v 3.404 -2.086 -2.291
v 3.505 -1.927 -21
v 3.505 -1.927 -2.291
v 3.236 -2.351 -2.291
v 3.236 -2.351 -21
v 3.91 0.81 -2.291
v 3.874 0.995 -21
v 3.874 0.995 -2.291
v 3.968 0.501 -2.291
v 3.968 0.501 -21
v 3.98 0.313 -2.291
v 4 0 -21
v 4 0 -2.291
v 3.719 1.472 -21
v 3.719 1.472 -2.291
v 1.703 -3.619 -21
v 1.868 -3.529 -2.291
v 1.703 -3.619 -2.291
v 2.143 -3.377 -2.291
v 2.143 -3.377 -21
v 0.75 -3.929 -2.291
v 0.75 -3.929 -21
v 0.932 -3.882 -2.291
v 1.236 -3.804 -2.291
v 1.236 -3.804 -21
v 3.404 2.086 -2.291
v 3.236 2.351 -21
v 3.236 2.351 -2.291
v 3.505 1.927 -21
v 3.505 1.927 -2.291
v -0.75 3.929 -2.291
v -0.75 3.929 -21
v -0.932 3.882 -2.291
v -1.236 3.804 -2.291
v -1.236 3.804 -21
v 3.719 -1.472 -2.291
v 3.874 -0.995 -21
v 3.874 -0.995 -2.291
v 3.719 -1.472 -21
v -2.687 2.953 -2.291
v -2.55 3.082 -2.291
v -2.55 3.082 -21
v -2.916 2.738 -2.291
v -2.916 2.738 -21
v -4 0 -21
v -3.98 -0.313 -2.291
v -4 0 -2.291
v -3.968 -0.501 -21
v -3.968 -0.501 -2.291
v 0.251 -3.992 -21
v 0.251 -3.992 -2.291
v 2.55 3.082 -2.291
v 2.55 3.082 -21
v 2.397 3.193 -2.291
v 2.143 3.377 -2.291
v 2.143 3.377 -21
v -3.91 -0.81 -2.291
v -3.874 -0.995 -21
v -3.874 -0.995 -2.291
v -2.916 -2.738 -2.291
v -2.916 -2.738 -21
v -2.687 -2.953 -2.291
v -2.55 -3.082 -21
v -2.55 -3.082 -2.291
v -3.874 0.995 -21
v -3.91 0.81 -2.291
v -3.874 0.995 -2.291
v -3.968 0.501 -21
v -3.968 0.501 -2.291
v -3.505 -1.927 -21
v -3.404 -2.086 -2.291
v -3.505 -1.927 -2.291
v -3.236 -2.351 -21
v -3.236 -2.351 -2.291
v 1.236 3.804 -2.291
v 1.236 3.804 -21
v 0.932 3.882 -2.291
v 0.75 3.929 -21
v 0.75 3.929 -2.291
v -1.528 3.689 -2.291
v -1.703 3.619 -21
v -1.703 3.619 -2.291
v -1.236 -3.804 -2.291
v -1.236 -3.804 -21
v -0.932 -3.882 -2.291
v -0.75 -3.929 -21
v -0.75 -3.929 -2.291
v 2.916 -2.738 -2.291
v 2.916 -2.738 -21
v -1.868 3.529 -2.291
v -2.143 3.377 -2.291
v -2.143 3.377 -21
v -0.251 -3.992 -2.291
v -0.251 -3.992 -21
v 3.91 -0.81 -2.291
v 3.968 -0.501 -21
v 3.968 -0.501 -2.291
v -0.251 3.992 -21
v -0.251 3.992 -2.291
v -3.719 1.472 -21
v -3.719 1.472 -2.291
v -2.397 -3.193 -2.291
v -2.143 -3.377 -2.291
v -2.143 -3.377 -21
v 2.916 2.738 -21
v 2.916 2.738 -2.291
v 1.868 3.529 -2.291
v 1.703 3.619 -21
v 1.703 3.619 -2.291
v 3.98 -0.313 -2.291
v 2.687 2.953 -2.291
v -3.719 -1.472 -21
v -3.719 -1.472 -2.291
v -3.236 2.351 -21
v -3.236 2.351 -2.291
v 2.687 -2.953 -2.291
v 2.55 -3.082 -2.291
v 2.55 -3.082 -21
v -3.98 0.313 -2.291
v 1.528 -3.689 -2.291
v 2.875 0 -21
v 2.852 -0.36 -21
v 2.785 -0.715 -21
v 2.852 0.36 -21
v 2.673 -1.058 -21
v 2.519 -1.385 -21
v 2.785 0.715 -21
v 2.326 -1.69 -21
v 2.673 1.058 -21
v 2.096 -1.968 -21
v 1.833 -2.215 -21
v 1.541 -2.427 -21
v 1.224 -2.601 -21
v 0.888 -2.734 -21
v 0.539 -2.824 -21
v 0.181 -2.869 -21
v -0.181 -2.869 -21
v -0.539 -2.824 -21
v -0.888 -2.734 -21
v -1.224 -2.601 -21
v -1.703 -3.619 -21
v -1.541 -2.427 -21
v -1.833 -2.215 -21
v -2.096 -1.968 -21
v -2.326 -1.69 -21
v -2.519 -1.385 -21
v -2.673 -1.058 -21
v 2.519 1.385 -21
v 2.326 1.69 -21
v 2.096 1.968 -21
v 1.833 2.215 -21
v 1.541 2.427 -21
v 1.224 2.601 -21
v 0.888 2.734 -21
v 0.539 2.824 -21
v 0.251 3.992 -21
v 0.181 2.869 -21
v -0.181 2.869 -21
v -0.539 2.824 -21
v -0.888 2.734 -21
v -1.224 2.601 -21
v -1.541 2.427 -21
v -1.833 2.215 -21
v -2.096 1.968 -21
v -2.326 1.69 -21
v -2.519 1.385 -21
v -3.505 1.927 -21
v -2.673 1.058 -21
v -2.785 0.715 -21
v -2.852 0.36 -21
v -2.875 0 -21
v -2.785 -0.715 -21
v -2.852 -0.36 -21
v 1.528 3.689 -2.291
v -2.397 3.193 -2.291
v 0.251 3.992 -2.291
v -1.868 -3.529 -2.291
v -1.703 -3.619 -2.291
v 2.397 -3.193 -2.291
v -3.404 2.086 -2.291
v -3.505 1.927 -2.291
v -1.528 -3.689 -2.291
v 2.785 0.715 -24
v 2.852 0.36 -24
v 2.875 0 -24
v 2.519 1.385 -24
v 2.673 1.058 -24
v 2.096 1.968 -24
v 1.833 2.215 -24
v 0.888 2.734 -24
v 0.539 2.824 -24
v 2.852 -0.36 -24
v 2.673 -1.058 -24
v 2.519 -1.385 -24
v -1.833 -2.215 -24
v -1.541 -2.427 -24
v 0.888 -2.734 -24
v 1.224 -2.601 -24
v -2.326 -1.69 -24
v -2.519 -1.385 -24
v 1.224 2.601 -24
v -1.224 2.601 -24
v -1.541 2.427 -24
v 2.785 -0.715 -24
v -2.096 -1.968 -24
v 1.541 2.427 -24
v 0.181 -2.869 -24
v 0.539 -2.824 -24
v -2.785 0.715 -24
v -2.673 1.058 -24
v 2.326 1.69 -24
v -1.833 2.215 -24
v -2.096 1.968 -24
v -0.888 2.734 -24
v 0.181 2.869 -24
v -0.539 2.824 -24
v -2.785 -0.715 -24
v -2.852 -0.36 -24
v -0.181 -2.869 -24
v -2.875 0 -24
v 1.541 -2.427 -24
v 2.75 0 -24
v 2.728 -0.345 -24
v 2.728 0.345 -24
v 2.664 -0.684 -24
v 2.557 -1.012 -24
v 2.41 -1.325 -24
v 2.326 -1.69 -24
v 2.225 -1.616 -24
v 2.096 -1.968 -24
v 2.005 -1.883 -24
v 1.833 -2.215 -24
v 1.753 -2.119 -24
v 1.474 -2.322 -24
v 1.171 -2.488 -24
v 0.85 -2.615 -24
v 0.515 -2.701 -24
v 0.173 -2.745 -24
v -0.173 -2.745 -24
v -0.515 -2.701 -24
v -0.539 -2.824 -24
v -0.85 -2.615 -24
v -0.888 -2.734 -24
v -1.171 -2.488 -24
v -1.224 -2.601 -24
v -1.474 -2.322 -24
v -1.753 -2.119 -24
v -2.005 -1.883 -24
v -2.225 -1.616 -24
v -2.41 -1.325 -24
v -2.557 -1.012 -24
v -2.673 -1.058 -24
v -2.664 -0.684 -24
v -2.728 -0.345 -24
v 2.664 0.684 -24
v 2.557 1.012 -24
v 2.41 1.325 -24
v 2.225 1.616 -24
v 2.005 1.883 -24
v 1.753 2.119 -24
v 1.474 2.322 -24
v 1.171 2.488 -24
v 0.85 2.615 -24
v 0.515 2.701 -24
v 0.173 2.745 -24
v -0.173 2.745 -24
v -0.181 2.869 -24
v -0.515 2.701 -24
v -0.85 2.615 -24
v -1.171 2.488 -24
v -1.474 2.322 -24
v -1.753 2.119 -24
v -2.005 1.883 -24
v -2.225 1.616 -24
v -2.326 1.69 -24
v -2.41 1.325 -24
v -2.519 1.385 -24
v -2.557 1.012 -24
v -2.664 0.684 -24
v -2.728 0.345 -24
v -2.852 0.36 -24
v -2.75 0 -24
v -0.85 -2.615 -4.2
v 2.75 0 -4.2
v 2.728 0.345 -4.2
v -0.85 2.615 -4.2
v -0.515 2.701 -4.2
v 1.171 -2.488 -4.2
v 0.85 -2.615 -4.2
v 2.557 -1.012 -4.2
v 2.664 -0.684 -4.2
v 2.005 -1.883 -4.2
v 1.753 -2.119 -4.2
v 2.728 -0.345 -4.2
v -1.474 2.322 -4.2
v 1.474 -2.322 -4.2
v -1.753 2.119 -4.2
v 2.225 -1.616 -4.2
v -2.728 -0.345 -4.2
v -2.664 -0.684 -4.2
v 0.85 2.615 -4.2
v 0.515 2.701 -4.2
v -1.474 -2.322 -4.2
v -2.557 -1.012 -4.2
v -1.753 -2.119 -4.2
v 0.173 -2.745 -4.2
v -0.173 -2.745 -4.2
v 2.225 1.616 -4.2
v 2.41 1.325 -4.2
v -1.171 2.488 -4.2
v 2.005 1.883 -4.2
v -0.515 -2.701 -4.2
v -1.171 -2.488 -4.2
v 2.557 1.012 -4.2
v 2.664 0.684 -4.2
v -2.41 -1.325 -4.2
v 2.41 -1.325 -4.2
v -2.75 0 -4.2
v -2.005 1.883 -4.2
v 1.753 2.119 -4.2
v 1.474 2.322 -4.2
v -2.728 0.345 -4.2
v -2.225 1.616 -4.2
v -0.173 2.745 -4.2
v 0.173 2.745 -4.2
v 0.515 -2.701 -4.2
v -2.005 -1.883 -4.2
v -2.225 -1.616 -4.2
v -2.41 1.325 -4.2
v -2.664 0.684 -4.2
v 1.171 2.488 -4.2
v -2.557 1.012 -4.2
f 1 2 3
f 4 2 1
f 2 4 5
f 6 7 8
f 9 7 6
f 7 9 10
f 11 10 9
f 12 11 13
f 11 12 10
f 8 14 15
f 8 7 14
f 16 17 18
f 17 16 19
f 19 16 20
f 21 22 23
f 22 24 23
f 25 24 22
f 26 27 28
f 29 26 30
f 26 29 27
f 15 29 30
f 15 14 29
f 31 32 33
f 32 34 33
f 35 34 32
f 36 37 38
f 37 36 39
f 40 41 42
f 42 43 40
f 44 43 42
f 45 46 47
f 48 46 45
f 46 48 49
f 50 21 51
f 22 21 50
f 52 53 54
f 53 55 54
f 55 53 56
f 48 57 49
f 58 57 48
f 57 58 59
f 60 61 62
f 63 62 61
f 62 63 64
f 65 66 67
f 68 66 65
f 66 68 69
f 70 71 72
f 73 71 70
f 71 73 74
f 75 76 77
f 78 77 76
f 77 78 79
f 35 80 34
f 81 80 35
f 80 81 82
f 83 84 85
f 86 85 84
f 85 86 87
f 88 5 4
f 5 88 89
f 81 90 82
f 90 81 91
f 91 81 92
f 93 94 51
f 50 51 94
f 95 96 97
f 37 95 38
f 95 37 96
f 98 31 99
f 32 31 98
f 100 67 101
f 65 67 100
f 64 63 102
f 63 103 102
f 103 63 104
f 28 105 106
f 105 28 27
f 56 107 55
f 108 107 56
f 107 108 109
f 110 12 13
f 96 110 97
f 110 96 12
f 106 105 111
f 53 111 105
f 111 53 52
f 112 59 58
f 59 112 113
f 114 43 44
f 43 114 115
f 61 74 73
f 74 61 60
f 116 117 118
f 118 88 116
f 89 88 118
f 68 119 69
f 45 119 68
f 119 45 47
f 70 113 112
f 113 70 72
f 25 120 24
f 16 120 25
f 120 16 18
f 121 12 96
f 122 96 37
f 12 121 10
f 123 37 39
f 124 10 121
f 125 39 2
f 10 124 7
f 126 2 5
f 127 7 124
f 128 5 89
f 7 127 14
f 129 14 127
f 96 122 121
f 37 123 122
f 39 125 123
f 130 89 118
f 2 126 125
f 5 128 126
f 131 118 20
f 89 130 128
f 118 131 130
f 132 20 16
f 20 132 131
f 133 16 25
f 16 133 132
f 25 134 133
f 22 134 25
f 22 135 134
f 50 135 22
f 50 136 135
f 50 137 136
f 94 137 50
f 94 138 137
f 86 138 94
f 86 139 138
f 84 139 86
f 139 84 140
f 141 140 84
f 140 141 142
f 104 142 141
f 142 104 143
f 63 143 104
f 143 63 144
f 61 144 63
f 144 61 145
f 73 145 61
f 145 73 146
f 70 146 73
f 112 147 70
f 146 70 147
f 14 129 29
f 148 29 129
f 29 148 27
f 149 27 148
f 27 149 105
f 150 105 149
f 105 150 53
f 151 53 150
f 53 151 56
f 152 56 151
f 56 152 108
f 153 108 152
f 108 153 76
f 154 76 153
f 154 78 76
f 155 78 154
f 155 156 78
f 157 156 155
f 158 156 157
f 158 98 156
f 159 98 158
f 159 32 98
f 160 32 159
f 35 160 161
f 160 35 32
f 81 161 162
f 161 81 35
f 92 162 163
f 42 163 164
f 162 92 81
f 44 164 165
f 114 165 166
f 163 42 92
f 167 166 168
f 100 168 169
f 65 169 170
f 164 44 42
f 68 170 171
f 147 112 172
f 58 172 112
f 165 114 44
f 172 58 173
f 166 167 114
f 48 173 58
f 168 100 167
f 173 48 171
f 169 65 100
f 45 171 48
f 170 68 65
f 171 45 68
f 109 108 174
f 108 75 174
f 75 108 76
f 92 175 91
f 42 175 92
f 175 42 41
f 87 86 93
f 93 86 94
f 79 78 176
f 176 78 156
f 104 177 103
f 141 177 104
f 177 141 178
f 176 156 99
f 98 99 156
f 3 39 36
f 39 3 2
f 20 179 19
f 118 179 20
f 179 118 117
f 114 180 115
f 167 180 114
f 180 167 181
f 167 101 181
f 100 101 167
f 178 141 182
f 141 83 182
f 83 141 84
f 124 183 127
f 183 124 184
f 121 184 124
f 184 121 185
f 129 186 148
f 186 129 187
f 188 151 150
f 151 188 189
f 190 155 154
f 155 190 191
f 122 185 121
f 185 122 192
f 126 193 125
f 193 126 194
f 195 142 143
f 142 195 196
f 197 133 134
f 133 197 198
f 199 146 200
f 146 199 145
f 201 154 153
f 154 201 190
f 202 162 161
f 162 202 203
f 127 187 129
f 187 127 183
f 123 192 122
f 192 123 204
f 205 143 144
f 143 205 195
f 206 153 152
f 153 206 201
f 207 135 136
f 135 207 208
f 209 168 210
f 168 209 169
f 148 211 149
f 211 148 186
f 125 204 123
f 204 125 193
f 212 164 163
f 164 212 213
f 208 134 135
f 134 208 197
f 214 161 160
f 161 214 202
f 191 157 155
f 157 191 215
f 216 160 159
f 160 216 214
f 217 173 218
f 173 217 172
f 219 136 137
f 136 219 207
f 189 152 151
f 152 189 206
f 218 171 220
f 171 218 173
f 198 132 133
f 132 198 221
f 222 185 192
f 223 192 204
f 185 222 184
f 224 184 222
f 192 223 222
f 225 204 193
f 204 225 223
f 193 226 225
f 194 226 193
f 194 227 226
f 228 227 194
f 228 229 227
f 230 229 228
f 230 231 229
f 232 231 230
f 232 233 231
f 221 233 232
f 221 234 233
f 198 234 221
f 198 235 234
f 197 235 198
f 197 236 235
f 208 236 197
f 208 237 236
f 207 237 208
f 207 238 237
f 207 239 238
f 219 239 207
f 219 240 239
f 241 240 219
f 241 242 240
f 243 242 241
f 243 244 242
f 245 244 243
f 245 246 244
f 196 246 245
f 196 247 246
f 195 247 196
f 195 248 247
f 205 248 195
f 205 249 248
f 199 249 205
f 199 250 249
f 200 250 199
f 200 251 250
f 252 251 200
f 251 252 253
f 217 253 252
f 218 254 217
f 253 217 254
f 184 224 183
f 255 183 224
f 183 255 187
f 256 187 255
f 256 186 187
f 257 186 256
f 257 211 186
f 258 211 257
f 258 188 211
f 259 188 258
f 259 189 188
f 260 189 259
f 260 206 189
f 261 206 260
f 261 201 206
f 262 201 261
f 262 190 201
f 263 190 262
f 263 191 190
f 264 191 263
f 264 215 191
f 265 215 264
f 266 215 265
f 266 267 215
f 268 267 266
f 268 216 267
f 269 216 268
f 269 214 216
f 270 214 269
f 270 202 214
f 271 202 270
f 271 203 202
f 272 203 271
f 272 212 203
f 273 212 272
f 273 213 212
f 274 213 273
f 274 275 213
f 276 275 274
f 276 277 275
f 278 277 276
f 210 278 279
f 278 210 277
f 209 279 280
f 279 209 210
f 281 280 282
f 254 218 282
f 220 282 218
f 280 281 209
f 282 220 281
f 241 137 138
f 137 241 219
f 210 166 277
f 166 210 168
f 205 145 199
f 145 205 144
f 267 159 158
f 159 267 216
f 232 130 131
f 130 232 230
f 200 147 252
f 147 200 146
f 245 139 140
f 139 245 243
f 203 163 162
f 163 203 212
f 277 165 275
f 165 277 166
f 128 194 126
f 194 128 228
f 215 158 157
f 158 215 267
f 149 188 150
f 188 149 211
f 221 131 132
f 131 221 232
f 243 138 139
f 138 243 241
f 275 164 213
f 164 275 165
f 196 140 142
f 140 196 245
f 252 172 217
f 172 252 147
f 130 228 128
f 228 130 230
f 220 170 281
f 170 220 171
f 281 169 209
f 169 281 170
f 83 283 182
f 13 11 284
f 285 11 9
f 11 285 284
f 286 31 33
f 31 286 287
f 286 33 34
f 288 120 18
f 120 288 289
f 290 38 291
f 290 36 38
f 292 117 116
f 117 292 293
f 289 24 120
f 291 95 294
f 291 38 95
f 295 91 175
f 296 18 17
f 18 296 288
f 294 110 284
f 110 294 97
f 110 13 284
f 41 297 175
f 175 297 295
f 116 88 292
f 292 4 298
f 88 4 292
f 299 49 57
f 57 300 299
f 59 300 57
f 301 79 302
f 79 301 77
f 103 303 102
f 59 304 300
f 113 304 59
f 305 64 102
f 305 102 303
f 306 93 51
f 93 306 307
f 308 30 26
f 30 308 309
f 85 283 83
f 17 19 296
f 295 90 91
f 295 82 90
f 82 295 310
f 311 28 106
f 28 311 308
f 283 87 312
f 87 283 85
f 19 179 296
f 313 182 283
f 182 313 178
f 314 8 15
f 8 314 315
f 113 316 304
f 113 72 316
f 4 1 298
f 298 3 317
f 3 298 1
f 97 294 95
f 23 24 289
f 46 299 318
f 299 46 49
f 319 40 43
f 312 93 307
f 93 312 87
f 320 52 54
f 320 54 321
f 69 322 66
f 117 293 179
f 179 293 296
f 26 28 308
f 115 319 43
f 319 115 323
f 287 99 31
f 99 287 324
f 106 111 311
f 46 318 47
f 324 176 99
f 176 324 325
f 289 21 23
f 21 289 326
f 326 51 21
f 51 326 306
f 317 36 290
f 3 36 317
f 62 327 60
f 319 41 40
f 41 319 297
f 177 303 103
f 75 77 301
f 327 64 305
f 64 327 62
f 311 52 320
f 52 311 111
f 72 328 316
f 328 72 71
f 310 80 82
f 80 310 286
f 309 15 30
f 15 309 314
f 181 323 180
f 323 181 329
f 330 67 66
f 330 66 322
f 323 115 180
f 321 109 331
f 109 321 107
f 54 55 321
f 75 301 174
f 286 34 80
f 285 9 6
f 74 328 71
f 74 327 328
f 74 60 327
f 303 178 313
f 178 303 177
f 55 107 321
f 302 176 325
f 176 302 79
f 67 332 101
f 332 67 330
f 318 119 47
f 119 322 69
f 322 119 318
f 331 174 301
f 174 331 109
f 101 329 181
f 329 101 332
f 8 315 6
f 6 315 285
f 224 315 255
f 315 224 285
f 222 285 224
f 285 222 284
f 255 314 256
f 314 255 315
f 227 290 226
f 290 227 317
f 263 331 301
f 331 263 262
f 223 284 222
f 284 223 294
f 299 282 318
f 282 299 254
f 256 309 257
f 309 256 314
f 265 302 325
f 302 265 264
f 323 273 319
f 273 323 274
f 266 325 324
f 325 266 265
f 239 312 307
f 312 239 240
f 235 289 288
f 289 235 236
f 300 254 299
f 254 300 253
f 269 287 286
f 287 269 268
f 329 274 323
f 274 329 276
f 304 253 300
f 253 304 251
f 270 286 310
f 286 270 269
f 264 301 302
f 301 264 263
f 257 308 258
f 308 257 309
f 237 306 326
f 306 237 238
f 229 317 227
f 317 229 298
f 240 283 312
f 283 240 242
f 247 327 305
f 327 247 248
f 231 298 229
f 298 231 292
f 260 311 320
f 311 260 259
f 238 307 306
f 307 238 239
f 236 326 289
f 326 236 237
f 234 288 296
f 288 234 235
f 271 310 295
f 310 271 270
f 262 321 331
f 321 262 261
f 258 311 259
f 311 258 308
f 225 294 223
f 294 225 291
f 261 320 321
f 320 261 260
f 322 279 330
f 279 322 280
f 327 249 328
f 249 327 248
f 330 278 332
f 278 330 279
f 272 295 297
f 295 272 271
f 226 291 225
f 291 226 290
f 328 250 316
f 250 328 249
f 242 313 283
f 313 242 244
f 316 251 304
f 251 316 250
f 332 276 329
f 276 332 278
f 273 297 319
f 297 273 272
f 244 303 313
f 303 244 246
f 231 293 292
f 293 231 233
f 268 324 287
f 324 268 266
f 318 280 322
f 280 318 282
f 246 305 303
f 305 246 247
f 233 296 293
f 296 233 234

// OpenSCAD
$fn = 50;

difference() {
	union() {
		translate(v = [0, 0, -21.0]) {
			cylinder(h = 24, r = 4.0);
		}
		#translate(v = [0, 0, -24.0]) {
			cylinder(h = 24, r = 2.875);
		}
	}
	union() {
		translate(v = [0, 0, 0]) {
			rotate(a = [0, 0, 0]) {
				difference() {
					union() {
						translate(v = [0, 0, -24.0]) {
							cylinder(h = 24, r = 2.25);
						}
						translate(v = [0, 0, -4.2]) {
							cylinder(h = 4.2, r1 = 2.75, r2 = 5.5);
						}
						translate(v = [0, 0, -24.0]) {
							cylinder(h = 24, r = 2.75);
						}
						translate(v = [0, 0, -24.0]) {
							cylinder(h = 24, r = 2.25);
						}
					}
					union();
				}
			}
		}
		#cylinder(h = 3, r = 6.25);
	}
}
